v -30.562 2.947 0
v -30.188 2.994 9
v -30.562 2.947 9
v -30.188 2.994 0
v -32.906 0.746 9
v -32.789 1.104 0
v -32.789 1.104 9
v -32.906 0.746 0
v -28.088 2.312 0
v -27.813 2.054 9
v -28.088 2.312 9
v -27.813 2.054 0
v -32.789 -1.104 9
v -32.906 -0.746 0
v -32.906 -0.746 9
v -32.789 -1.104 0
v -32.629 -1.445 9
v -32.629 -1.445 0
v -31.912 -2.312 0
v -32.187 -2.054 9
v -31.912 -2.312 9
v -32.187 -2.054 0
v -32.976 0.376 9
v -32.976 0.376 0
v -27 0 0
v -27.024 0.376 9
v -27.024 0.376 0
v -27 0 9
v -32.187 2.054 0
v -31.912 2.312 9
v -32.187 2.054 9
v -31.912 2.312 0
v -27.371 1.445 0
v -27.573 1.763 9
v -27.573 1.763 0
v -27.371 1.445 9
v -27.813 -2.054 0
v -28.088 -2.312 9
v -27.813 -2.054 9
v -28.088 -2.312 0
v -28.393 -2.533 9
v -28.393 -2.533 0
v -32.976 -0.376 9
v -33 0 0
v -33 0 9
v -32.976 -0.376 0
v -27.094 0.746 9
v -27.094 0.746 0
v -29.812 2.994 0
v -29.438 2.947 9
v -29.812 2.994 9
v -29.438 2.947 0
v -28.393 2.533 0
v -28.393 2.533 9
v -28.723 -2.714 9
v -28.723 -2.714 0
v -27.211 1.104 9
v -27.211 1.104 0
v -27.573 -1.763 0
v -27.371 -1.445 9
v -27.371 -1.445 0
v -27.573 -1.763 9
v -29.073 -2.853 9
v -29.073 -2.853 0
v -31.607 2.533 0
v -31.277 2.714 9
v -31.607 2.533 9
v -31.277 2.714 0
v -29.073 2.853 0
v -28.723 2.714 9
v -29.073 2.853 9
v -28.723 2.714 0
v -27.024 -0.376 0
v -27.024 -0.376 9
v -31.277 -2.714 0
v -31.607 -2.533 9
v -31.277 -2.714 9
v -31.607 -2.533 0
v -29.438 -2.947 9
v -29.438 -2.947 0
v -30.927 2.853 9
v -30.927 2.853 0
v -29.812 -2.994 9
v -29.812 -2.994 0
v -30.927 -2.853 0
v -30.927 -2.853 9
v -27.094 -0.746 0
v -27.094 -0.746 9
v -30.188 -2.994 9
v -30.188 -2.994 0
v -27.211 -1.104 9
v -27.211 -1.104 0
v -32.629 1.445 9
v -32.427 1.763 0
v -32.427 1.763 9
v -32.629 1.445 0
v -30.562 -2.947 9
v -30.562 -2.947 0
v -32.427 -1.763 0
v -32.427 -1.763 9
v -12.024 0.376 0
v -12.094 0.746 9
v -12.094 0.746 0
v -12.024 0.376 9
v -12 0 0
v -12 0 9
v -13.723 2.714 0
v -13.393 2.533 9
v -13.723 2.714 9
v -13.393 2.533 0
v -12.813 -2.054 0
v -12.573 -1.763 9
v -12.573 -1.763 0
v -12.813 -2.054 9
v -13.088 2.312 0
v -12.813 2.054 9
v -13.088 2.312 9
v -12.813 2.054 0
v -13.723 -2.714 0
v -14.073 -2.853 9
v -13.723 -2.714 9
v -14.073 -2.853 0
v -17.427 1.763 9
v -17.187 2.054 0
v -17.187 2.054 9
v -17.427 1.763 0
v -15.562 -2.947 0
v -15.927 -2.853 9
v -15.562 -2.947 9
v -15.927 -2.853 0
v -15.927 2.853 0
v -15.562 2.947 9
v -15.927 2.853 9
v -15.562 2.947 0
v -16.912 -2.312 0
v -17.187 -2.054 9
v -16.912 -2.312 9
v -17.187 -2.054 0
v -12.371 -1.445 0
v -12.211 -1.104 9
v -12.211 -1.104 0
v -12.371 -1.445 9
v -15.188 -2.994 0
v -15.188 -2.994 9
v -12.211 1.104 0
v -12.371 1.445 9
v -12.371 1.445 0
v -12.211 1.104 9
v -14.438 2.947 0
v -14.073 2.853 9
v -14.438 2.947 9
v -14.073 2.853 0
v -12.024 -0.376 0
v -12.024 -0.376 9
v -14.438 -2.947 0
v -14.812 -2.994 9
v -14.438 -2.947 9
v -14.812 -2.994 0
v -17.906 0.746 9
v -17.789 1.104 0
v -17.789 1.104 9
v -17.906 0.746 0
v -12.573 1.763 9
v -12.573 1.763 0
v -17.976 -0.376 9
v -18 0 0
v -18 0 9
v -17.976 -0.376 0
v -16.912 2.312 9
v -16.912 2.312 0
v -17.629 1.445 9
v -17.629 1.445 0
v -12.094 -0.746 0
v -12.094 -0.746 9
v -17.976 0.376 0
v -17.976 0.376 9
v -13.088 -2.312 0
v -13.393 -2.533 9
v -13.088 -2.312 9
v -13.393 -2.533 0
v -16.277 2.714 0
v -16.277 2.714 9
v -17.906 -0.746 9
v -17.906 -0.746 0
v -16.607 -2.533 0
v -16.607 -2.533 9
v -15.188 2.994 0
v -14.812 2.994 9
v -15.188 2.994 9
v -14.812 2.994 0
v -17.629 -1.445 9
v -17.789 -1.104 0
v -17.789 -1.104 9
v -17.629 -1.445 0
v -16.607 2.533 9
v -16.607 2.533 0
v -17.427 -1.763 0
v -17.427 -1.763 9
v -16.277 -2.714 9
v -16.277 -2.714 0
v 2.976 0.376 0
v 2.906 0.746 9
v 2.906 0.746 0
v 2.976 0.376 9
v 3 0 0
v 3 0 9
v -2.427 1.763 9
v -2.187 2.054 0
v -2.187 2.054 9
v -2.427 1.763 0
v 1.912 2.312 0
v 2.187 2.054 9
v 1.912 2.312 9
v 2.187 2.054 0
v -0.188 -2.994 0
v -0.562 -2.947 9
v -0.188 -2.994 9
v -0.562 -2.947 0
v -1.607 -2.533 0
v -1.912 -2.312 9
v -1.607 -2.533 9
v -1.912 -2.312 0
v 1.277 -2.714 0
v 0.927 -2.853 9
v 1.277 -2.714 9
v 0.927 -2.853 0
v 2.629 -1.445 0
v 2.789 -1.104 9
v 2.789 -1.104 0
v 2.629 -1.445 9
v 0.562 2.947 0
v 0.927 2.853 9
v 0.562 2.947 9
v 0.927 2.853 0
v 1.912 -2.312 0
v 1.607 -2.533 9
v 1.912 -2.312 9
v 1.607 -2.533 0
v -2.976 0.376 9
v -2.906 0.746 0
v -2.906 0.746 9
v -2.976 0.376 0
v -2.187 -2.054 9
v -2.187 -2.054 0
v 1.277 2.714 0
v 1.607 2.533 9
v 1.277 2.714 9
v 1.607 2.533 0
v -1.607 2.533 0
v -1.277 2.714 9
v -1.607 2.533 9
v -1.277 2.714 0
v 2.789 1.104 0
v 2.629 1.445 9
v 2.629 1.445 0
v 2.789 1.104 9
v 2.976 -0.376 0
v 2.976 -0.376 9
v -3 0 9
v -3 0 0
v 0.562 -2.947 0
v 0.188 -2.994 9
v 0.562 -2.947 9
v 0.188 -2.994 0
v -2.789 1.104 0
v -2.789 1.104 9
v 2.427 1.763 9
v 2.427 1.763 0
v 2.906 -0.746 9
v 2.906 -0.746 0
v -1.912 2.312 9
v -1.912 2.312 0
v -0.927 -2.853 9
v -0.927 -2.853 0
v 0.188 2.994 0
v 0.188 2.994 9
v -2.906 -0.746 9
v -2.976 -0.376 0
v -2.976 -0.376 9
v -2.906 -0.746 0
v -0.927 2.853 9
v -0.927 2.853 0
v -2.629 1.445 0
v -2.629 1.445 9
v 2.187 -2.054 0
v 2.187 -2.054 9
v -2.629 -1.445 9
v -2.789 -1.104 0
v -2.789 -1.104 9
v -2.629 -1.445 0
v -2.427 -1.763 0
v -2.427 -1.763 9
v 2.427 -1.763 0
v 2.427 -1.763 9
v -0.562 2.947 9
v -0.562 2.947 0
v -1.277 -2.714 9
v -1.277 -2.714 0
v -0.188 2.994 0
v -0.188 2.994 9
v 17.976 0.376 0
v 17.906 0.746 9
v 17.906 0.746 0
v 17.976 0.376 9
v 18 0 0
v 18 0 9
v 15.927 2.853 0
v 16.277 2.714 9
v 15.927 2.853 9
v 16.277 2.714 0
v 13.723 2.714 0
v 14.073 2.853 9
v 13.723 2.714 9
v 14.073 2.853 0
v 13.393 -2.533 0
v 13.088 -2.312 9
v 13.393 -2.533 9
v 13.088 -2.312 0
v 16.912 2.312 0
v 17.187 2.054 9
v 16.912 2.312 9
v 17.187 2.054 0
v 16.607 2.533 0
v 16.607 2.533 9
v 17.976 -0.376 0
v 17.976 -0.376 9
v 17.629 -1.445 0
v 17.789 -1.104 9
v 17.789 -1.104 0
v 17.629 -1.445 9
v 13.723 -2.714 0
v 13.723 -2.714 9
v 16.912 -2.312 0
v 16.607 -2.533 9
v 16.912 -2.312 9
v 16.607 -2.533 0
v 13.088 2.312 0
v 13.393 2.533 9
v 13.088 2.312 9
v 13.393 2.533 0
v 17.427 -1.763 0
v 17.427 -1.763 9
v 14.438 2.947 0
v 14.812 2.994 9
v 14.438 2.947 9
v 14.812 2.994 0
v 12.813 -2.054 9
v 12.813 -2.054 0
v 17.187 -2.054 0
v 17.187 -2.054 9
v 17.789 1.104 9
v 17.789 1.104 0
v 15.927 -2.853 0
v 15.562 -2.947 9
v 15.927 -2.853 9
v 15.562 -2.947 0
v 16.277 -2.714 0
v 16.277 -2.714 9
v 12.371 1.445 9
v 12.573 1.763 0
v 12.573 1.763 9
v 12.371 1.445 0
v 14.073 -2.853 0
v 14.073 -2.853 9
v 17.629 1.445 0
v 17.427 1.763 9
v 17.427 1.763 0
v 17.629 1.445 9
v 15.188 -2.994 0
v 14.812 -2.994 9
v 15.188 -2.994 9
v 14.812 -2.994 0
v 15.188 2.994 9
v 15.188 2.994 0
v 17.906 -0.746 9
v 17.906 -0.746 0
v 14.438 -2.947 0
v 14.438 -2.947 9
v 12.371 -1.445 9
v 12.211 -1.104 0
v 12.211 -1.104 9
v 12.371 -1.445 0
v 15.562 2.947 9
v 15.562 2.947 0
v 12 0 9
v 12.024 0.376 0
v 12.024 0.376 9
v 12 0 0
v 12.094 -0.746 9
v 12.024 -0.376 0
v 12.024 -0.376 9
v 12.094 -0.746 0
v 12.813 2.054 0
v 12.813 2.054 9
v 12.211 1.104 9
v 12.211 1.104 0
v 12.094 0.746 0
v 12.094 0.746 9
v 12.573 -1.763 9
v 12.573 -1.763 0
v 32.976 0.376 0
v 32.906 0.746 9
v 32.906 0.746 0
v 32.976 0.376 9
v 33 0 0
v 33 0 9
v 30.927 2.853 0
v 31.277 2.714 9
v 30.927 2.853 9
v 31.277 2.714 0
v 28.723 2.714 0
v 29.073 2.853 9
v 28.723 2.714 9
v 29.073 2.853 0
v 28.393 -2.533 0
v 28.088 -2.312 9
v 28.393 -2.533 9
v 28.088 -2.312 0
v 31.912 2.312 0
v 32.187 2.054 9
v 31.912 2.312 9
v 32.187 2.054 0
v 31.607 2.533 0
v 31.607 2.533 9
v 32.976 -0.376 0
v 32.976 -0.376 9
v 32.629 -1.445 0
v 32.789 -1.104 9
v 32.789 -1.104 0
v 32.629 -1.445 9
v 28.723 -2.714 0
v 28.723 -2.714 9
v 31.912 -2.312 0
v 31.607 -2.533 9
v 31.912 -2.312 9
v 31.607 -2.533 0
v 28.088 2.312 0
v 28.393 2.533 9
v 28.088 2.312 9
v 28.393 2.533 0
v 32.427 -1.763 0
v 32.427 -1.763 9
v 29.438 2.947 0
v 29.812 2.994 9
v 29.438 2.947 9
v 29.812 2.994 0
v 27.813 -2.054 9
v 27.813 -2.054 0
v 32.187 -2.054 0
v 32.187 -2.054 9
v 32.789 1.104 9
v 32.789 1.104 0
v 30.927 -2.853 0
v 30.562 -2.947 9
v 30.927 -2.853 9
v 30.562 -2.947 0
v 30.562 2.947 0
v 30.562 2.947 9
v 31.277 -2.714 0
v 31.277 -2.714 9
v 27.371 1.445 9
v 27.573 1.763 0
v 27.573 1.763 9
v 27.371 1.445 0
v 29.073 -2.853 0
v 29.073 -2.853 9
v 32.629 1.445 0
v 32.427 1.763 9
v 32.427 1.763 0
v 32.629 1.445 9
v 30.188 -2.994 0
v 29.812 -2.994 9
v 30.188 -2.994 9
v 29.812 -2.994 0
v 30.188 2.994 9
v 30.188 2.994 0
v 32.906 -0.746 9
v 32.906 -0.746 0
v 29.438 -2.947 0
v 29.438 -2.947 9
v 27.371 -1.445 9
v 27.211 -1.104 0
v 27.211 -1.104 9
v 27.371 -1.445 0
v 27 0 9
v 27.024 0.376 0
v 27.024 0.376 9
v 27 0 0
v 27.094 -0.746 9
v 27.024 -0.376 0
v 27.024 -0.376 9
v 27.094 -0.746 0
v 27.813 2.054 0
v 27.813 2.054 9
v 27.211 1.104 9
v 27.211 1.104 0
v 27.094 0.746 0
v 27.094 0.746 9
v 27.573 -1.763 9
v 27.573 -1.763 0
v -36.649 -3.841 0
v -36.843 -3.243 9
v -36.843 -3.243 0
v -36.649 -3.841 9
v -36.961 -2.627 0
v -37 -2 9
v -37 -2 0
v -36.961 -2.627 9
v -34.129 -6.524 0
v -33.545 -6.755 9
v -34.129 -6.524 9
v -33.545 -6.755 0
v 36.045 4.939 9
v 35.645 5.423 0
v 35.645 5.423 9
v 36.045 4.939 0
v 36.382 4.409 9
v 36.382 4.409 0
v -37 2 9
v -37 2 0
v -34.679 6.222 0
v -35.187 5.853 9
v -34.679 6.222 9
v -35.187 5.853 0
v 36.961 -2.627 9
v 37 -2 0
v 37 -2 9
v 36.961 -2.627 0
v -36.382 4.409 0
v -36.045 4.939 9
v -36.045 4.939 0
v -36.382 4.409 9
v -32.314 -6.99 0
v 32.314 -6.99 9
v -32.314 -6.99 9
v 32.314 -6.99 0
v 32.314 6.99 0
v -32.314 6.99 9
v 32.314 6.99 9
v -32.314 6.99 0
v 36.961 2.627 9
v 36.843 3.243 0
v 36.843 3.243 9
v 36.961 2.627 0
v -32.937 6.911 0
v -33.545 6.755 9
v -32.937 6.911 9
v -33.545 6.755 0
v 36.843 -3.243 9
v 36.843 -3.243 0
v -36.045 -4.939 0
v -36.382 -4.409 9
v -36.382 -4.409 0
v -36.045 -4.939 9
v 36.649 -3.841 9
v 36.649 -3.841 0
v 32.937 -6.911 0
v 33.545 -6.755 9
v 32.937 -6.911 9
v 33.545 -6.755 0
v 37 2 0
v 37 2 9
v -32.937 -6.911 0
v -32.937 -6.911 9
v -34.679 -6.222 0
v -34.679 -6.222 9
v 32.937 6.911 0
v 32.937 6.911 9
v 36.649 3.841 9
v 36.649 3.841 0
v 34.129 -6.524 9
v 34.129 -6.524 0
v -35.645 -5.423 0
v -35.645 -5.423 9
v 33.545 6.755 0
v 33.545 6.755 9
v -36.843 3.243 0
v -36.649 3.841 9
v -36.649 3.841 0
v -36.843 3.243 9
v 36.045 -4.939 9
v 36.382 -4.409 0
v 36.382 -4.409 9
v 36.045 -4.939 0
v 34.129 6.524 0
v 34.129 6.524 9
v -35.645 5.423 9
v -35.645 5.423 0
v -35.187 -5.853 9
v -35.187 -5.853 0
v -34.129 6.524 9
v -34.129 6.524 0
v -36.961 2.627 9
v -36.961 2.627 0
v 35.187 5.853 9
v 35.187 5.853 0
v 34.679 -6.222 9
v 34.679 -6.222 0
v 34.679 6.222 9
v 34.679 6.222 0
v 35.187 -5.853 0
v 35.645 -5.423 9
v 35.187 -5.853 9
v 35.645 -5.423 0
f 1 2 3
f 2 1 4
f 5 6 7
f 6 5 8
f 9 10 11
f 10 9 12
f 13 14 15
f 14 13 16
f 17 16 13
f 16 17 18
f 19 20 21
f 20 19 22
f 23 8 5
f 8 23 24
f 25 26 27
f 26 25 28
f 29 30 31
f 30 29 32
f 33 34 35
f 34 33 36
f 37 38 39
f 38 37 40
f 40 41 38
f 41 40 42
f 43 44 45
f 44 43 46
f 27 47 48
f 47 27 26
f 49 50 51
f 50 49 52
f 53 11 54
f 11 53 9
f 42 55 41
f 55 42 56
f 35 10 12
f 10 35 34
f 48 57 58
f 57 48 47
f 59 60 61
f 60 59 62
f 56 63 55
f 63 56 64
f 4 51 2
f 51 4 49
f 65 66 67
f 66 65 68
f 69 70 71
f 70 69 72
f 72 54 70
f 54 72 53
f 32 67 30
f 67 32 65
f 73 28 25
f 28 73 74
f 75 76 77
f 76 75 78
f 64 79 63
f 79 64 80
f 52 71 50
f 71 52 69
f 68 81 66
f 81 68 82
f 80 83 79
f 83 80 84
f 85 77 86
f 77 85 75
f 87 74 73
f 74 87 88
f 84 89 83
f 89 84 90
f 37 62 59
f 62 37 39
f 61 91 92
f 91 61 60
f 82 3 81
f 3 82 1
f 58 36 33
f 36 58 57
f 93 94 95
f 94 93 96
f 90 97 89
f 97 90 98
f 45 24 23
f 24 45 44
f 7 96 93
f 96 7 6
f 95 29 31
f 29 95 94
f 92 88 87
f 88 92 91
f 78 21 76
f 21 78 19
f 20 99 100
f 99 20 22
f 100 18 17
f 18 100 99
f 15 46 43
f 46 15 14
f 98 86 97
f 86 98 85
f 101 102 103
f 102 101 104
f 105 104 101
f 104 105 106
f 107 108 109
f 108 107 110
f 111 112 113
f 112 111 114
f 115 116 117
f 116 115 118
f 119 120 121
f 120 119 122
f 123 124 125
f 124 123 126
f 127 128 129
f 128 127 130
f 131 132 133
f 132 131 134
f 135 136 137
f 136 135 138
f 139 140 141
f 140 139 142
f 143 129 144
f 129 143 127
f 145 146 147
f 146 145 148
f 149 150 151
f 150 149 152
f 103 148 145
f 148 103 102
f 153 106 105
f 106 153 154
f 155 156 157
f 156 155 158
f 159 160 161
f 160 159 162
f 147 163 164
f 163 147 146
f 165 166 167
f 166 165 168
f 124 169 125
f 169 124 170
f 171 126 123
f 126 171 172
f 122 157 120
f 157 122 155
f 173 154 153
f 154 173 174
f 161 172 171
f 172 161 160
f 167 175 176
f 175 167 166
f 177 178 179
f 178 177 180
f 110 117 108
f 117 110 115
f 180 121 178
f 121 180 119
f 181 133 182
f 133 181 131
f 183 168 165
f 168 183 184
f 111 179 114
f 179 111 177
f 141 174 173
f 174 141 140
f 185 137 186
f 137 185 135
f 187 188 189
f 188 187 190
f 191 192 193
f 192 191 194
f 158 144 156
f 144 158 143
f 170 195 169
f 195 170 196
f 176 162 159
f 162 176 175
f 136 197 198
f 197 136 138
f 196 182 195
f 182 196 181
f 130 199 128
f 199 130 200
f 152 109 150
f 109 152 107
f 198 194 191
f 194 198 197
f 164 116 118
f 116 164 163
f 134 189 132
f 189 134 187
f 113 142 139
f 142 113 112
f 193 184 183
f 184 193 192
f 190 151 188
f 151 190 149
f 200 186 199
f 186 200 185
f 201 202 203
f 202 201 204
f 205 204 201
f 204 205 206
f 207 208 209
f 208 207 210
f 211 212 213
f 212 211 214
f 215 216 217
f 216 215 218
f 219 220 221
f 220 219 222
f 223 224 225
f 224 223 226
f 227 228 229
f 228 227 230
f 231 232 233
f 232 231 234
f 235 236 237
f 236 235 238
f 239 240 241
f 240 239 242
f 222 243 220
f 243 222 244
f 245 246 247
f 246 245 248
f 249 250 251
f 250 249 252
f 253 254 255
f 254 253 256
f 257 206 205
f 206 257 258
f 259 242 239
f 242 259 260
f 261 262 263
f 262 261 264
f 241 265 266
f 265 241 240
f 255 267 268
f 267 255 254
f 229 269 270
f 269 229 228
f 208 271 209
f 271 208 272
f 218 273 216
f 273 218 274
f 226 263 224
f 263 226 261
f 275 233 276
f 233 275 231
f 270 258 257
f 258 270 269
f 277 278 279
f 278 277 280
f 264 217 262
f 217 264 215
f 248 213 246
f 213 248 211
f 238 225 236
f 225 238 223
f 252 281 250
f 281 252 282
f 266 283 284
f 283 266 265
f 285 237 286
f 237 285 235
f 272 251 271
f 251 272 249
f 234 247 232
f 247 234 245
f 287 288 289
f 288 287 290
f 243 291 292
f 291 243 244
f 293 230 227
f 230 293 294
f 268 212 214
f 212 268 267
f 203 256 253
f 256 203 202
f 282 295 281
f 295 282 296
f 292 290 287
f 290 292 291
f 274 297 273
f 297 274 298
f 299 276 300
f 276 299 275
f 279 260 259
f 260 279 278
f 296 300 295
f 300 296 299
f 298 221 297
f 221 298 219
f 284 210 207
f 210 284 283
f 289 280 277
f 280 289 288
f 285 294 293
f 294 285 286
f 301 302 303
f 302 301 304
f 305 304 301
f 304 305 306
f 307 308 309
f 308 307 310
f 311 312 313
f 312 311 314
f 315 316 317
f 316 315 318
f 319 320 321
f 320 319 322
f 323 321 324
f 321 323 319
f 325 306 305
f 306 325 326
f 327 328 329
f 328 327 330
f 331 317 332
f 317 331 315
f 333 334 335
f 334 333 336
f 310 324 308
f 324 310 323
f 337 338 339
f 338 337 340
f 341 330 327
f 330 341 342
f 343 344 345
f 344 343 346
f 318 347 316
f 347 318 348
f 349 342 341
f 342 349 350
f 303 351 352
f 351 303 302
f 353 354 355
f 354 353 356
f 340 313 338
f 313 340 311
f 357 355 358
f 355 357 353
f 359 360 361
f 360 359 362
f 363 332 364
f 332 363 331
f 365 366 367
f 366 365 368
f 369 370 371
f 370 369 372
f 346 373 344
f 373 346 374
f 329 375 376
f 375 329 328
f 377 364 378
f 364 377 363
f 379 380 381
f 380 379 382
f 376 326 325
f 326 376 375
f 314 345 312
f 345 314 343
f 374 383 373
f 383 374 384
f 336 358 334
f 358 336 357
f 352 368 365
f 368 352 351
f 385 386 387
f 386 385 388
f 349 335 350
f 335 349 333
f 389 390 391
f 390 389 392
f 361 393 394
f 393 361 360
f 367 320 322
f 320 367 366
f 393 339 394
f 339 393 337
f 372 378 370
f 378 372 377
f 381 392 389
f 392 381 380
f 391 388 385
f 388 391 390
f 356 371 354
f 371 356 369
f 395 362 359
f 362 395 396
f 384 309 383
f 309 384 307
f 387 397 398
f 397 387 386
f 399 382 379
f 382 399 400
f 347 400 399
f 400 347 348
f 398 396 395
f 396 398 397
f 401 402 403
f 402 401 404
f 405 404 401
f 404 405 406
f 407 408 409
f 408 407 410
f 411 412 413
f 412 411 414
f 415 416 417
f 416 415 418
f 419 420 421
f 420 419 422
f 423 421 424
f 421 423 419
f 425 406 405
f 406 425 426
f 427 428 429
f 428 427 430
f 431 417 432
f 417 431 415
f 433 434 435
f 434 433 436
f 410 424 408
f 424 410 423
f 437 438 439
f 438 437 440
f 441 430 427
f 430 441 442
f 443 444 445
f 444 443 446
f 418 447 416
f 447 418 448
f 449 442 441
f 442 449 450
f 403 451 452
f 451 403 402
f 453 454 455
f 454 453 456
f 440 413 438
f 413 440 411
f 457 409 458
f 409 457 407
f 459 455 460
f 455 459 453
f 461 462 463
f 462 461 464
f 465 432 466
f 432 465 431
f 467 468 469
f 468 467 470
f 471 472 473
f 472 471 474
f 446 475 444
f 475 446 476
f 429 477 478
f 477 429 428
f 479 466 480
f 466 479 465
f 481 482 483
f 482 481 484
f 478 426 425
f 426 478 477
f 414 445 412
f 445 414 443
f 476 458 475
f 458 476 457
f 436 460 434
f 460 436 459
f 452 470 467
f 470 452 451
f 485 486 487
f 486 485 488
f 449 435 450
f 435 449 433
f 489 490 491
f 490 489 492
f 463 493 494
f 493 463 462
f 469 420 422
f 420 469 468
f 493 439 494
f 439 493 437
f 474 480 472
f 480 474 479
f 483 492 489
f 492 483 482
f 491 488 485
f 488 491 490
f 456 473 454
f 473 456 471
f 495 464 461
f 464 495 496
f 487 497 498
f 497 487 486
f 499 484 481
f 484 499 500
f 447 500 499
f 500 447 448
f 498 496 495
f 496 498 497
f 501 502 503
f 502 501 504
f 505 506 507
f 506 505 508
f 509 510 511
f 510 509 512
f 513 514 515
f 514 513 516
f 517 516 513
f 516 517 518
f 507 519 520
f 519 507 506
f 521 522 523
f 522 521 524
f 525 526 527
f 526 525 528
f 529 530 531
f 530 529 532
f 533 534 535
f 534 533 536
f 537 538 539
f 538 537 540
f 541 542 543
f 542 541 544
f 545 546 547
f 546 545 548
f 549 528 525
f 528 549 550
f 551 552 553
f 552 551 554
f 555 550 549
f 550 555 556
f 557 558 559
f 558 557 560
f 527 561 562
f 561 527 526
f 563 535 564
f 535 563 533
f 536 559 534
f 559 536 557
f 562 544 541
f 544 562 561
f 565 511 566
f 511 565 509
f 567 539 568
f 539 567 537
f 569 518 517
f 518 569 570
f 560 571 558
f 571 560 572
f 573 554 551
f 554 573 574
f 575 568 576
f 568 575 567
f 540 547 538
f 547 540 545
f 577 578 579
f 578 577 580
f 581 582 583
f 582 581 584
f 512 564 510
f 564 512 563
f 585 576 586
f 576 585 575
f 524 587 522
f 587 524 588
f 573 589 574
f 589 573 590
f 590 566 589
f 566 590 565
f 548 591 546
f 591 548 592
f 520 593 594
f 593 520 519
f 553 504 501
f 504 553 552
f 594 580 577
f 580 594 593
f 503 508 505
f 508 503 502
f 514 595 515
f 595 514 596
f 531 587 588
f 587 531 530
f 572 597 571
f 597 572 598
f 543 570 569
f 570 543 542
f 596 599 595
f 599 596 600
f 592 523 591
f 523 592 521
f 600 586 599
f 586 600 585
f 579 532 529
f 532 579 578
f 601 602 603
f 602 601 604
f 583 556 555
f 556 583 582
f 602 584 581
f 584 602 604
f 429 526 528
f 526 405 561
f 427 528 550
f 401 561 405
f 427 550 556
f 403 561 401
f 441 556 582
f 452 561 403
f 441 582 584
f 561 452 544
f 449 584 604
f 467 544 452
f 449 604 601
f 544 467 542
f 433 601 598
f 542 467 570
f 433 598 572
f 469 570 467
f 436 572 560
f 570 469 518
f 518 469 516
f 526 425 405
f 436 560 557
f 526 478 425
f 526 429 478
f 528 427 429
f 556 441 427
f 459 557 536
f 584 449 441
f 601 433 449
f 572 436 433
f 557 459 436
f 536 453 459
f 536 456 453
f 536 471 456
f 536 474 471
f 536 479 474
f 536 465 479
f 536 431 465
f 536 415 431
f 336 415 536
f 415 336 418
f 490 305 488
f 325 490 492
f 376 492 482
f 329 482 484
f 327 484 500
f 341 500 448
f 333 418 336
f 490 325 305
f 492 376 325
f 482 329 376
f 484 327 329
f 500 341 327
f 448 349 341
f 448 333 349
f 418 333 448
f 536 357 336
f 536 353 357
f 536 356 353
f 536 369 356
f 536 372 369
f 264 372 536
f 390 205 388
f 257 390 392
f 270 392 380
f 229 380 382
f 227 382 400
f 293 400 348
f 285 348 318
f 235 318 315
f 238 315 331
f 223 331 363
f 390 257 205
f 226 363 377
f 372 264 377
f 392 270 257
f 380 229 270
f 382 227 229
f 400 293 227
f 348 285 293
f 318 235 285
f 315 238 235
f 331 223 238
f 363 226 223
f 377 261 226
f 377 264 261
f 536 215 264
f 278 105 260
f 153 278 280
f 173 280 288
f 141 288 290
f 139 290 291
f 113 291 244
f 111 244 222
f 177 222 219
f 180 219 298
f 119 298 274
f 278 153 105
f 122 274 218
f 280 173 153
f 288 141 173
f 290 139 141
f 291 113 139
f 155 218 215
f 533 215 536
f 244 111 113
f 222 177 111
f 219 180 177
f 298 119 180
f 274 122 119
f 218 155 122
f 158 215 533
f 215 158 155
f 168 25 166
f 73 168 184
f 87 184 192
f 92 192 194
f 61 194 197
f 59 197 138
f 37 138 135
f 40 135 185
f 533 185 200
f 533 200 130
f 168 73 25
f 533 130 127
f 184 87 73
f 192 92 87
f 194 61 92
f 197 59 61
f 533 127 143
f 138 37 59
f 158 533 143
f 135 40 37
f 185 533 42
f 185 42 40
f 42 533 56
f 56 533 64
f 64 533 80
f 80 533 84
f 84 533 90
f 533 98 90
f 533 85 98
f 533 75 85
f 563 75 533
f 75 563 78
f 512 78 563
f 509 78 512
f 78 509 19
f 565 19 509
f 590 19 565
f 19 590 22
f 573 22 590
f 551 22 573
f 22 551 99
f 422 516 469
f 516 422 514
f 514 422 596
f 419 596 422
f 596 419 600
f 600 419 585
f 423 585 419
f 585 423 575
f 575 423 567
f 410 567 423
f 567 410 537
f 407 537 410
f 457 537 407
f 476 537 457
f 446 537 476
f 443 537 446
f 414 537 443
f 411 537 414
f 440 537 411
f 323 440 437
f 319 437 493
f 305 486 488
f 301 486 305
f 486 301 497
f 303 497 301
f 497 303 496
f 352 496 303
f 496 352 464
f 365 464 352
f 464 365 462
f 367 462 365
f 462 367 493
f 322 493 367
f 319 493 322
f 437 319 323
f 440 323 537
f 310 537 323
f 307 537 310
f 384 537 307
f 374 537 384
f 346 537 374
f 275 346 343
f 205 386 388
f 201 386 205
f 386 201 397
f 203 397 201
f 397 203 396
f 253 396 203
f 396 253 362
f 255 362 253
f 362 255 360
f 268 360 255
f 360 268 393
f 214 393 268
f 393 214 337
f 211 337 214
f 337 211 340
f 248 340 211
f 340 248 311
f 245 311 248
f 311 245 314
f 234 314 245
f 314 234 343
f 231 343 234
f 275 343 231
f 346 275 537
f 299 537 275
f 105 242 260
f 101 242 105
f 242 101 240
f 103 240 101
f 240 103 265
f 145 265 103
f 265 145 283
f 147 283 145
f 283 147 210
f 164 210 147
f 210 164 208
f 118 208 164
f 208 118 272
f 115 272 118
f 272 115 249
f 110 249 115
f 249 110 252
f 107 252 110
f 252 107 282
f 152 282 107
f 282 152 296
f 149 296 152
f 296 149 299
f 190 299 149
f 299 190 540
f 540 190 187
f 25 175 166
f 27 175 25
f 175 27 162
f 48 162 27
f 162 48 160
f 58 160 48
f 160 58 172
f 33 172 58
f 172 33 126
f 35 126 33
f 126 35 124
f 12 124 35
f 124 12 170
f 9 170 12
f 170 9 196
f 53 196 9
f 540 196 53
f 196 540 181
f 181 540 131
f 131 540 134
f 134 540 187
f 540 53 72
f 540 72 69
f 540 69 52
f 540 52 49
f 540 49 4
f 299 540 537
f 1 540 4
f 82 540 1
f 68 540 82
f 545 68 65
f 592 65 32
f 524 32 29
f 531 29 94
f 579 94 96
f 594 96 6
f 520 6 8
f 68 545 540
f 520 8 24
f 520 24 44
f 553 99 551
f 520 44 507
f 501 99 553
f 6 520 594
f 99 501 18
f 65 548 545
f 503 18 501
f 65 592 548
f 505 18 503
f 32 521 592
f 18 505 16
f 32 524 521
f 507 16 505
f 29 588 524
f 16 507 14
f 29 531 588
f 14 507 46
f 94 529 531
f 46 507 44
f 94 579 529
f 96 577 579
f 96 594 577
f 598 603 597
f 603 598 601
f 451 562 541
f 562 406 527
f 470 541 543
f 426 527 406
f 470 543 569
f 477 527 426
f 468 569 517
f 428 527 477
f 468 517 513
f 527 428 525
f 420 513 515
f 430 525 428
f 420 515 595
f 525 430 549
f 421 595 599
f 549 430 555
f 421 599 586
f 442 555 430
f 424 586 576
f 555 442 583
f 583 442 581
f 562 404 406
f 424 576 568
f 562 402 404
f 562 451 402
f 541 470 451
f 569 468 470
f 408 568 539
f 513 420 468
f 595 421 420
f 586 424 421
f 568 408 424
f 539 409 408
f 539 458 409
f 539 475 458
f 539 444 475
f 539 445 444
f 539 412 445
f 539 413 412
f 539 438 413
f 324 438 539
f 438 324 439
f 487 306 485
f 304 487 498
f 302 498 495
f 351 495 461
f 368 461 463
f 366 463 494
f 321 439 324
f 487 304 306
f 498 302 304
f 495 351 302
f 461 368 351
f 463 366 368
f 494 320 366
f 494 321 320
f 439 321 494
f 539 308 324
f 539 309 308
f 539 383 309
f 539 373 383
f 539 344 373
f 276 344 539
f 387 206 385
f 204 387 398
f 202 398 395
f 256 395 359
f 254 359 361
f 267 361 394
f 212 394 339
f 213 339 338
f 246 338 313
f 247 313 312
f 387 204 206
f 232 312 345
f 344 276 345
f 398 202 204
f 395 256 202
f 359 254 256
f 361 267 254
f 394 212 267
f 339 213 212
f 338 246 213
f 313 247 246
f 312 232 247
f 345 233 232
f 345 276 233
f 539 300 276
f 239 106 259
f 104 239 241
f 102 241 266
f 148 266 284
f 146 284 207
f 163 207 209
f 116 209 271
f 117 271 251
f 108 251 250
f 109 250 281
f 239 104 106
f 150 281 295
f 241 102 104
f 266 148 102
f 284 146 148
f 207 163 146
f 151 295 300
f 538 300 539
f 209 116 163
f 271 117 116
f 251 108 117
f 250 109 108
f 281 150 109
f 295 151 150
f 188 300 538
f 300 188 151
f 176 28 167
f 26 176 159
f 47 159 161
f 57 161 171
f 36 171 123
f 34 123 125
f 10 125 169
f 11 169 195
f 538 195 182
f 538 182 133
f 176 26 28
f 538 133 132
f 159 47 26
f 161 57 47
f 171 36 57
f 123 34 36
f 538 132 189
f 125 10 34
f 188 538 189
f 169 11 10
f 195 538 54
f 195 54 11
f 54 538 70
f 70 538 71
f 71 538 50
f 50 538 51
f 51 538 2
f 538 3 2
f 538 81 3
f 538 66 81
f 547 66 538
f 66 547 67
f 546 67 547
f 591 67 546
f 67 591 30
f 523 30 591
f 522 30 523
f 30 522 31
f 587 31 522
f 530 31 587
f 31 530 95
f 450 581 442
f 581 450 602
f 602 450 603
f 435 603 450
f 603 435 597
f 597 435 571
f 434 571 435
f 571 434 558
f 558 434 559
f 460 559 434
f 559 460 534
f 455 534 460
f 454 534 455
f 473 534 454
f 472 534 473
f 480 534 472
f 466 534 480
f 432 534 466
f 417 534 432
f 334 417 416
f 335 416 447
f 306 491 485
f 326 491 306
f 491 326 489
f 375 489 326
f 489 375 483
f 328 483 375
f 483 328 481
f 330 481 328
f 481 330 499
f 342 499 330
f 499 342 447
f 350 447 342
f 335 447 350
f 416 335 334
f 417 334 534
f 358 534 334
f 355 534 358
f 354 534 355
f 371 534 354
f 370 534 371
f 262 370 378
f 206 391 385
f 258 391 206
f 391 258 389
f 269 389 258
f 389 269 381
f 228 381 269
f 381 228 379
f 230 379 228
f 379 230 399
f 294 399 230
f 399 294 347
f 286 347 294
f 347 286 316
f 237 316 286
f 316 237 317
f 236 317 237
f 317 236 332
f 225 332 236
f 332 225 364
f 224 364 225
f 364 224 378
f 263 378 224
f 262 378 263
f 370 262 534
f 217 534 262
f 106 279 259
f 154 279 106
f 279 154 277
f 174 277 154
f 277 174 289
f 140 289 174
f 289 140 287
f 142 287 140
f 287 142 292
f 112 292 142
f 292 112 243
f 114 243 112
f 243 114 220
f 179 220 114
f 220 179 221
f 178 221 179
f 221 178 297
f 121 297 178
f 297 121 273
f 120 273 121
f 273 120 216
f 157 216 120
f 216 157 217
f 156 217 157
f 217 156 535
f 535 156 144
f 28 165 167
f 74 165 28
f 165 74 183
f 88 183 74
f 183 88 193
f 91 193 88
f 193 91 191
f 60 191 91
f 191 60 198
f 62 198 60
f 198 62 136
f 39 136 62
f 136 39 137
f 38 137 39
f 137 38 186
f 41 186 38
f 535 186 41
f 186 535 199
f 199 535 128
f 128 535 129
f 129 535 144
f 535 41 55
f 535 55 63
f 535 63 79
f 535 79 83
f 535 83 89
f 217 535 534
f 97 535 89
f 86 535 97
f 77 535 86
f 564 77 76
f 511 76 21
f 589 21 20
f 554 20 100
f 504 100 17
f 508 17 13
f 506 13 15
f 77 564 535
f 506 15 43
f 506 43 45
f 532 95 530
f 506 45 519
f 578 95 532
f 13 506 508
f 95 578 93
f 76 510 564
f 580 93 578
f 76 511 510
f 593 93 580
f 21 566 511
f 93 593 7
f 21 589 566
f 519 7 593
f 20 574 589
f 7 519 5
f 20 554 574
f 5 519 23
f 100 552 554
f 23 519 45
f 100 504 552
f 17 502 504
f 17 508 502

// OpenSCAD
$fn = 50;


difference() {
	union() {
		hull() {
			translate(v = [-32.0000000000, 2.0000000000, 0]) {
				cylinder(h = 9, r = 5);
			}
			translate(v = [32.0000000000, 2.0000000000, 0]) {
				cylinder(h = 9, r = 5);
			}
			translate(v = [-32.0000000000, -2.0000000000, 0]) {
				cylinder(h = 9, r = 5);
			}
			translate(v = [32.0000000000, -2.0000000000, 0]) {
				cylinder(h = 9, r = 5);
			}
		}
	}
	union() {
		translate(v = [-30.0000000000, 0.0000000000, 0]) {
			translate(v = [0, 0, -100]) {
				cylinder(h = 200, r = 3.0000000000);
			}
		}
		translate(v = [-15.0000000000, 0.0000000000, 0]) {
			translate(v = [0, 0, -100]) {
				cylinder(h = 200, r = 3.0000000000);
			}
		}
		translate(v = [0, 0, -100]) {
			cylinder(h = 200, r = 3.0000000000);
		}
		translate(v = [15.0000000000, 0.0000000000, 0]) {
			translate(v = [0, 0, -100]) {
				cylinder(h = 200, r = 3.0000000000);
			}
		}
		translate(v = [30.0000000000, 0.0000000000, 0]) {
			translate(v = [0, 0, -100]) {
				cylinder(h = 200, r = 3.0000000000);
			}
		}
	}
}
